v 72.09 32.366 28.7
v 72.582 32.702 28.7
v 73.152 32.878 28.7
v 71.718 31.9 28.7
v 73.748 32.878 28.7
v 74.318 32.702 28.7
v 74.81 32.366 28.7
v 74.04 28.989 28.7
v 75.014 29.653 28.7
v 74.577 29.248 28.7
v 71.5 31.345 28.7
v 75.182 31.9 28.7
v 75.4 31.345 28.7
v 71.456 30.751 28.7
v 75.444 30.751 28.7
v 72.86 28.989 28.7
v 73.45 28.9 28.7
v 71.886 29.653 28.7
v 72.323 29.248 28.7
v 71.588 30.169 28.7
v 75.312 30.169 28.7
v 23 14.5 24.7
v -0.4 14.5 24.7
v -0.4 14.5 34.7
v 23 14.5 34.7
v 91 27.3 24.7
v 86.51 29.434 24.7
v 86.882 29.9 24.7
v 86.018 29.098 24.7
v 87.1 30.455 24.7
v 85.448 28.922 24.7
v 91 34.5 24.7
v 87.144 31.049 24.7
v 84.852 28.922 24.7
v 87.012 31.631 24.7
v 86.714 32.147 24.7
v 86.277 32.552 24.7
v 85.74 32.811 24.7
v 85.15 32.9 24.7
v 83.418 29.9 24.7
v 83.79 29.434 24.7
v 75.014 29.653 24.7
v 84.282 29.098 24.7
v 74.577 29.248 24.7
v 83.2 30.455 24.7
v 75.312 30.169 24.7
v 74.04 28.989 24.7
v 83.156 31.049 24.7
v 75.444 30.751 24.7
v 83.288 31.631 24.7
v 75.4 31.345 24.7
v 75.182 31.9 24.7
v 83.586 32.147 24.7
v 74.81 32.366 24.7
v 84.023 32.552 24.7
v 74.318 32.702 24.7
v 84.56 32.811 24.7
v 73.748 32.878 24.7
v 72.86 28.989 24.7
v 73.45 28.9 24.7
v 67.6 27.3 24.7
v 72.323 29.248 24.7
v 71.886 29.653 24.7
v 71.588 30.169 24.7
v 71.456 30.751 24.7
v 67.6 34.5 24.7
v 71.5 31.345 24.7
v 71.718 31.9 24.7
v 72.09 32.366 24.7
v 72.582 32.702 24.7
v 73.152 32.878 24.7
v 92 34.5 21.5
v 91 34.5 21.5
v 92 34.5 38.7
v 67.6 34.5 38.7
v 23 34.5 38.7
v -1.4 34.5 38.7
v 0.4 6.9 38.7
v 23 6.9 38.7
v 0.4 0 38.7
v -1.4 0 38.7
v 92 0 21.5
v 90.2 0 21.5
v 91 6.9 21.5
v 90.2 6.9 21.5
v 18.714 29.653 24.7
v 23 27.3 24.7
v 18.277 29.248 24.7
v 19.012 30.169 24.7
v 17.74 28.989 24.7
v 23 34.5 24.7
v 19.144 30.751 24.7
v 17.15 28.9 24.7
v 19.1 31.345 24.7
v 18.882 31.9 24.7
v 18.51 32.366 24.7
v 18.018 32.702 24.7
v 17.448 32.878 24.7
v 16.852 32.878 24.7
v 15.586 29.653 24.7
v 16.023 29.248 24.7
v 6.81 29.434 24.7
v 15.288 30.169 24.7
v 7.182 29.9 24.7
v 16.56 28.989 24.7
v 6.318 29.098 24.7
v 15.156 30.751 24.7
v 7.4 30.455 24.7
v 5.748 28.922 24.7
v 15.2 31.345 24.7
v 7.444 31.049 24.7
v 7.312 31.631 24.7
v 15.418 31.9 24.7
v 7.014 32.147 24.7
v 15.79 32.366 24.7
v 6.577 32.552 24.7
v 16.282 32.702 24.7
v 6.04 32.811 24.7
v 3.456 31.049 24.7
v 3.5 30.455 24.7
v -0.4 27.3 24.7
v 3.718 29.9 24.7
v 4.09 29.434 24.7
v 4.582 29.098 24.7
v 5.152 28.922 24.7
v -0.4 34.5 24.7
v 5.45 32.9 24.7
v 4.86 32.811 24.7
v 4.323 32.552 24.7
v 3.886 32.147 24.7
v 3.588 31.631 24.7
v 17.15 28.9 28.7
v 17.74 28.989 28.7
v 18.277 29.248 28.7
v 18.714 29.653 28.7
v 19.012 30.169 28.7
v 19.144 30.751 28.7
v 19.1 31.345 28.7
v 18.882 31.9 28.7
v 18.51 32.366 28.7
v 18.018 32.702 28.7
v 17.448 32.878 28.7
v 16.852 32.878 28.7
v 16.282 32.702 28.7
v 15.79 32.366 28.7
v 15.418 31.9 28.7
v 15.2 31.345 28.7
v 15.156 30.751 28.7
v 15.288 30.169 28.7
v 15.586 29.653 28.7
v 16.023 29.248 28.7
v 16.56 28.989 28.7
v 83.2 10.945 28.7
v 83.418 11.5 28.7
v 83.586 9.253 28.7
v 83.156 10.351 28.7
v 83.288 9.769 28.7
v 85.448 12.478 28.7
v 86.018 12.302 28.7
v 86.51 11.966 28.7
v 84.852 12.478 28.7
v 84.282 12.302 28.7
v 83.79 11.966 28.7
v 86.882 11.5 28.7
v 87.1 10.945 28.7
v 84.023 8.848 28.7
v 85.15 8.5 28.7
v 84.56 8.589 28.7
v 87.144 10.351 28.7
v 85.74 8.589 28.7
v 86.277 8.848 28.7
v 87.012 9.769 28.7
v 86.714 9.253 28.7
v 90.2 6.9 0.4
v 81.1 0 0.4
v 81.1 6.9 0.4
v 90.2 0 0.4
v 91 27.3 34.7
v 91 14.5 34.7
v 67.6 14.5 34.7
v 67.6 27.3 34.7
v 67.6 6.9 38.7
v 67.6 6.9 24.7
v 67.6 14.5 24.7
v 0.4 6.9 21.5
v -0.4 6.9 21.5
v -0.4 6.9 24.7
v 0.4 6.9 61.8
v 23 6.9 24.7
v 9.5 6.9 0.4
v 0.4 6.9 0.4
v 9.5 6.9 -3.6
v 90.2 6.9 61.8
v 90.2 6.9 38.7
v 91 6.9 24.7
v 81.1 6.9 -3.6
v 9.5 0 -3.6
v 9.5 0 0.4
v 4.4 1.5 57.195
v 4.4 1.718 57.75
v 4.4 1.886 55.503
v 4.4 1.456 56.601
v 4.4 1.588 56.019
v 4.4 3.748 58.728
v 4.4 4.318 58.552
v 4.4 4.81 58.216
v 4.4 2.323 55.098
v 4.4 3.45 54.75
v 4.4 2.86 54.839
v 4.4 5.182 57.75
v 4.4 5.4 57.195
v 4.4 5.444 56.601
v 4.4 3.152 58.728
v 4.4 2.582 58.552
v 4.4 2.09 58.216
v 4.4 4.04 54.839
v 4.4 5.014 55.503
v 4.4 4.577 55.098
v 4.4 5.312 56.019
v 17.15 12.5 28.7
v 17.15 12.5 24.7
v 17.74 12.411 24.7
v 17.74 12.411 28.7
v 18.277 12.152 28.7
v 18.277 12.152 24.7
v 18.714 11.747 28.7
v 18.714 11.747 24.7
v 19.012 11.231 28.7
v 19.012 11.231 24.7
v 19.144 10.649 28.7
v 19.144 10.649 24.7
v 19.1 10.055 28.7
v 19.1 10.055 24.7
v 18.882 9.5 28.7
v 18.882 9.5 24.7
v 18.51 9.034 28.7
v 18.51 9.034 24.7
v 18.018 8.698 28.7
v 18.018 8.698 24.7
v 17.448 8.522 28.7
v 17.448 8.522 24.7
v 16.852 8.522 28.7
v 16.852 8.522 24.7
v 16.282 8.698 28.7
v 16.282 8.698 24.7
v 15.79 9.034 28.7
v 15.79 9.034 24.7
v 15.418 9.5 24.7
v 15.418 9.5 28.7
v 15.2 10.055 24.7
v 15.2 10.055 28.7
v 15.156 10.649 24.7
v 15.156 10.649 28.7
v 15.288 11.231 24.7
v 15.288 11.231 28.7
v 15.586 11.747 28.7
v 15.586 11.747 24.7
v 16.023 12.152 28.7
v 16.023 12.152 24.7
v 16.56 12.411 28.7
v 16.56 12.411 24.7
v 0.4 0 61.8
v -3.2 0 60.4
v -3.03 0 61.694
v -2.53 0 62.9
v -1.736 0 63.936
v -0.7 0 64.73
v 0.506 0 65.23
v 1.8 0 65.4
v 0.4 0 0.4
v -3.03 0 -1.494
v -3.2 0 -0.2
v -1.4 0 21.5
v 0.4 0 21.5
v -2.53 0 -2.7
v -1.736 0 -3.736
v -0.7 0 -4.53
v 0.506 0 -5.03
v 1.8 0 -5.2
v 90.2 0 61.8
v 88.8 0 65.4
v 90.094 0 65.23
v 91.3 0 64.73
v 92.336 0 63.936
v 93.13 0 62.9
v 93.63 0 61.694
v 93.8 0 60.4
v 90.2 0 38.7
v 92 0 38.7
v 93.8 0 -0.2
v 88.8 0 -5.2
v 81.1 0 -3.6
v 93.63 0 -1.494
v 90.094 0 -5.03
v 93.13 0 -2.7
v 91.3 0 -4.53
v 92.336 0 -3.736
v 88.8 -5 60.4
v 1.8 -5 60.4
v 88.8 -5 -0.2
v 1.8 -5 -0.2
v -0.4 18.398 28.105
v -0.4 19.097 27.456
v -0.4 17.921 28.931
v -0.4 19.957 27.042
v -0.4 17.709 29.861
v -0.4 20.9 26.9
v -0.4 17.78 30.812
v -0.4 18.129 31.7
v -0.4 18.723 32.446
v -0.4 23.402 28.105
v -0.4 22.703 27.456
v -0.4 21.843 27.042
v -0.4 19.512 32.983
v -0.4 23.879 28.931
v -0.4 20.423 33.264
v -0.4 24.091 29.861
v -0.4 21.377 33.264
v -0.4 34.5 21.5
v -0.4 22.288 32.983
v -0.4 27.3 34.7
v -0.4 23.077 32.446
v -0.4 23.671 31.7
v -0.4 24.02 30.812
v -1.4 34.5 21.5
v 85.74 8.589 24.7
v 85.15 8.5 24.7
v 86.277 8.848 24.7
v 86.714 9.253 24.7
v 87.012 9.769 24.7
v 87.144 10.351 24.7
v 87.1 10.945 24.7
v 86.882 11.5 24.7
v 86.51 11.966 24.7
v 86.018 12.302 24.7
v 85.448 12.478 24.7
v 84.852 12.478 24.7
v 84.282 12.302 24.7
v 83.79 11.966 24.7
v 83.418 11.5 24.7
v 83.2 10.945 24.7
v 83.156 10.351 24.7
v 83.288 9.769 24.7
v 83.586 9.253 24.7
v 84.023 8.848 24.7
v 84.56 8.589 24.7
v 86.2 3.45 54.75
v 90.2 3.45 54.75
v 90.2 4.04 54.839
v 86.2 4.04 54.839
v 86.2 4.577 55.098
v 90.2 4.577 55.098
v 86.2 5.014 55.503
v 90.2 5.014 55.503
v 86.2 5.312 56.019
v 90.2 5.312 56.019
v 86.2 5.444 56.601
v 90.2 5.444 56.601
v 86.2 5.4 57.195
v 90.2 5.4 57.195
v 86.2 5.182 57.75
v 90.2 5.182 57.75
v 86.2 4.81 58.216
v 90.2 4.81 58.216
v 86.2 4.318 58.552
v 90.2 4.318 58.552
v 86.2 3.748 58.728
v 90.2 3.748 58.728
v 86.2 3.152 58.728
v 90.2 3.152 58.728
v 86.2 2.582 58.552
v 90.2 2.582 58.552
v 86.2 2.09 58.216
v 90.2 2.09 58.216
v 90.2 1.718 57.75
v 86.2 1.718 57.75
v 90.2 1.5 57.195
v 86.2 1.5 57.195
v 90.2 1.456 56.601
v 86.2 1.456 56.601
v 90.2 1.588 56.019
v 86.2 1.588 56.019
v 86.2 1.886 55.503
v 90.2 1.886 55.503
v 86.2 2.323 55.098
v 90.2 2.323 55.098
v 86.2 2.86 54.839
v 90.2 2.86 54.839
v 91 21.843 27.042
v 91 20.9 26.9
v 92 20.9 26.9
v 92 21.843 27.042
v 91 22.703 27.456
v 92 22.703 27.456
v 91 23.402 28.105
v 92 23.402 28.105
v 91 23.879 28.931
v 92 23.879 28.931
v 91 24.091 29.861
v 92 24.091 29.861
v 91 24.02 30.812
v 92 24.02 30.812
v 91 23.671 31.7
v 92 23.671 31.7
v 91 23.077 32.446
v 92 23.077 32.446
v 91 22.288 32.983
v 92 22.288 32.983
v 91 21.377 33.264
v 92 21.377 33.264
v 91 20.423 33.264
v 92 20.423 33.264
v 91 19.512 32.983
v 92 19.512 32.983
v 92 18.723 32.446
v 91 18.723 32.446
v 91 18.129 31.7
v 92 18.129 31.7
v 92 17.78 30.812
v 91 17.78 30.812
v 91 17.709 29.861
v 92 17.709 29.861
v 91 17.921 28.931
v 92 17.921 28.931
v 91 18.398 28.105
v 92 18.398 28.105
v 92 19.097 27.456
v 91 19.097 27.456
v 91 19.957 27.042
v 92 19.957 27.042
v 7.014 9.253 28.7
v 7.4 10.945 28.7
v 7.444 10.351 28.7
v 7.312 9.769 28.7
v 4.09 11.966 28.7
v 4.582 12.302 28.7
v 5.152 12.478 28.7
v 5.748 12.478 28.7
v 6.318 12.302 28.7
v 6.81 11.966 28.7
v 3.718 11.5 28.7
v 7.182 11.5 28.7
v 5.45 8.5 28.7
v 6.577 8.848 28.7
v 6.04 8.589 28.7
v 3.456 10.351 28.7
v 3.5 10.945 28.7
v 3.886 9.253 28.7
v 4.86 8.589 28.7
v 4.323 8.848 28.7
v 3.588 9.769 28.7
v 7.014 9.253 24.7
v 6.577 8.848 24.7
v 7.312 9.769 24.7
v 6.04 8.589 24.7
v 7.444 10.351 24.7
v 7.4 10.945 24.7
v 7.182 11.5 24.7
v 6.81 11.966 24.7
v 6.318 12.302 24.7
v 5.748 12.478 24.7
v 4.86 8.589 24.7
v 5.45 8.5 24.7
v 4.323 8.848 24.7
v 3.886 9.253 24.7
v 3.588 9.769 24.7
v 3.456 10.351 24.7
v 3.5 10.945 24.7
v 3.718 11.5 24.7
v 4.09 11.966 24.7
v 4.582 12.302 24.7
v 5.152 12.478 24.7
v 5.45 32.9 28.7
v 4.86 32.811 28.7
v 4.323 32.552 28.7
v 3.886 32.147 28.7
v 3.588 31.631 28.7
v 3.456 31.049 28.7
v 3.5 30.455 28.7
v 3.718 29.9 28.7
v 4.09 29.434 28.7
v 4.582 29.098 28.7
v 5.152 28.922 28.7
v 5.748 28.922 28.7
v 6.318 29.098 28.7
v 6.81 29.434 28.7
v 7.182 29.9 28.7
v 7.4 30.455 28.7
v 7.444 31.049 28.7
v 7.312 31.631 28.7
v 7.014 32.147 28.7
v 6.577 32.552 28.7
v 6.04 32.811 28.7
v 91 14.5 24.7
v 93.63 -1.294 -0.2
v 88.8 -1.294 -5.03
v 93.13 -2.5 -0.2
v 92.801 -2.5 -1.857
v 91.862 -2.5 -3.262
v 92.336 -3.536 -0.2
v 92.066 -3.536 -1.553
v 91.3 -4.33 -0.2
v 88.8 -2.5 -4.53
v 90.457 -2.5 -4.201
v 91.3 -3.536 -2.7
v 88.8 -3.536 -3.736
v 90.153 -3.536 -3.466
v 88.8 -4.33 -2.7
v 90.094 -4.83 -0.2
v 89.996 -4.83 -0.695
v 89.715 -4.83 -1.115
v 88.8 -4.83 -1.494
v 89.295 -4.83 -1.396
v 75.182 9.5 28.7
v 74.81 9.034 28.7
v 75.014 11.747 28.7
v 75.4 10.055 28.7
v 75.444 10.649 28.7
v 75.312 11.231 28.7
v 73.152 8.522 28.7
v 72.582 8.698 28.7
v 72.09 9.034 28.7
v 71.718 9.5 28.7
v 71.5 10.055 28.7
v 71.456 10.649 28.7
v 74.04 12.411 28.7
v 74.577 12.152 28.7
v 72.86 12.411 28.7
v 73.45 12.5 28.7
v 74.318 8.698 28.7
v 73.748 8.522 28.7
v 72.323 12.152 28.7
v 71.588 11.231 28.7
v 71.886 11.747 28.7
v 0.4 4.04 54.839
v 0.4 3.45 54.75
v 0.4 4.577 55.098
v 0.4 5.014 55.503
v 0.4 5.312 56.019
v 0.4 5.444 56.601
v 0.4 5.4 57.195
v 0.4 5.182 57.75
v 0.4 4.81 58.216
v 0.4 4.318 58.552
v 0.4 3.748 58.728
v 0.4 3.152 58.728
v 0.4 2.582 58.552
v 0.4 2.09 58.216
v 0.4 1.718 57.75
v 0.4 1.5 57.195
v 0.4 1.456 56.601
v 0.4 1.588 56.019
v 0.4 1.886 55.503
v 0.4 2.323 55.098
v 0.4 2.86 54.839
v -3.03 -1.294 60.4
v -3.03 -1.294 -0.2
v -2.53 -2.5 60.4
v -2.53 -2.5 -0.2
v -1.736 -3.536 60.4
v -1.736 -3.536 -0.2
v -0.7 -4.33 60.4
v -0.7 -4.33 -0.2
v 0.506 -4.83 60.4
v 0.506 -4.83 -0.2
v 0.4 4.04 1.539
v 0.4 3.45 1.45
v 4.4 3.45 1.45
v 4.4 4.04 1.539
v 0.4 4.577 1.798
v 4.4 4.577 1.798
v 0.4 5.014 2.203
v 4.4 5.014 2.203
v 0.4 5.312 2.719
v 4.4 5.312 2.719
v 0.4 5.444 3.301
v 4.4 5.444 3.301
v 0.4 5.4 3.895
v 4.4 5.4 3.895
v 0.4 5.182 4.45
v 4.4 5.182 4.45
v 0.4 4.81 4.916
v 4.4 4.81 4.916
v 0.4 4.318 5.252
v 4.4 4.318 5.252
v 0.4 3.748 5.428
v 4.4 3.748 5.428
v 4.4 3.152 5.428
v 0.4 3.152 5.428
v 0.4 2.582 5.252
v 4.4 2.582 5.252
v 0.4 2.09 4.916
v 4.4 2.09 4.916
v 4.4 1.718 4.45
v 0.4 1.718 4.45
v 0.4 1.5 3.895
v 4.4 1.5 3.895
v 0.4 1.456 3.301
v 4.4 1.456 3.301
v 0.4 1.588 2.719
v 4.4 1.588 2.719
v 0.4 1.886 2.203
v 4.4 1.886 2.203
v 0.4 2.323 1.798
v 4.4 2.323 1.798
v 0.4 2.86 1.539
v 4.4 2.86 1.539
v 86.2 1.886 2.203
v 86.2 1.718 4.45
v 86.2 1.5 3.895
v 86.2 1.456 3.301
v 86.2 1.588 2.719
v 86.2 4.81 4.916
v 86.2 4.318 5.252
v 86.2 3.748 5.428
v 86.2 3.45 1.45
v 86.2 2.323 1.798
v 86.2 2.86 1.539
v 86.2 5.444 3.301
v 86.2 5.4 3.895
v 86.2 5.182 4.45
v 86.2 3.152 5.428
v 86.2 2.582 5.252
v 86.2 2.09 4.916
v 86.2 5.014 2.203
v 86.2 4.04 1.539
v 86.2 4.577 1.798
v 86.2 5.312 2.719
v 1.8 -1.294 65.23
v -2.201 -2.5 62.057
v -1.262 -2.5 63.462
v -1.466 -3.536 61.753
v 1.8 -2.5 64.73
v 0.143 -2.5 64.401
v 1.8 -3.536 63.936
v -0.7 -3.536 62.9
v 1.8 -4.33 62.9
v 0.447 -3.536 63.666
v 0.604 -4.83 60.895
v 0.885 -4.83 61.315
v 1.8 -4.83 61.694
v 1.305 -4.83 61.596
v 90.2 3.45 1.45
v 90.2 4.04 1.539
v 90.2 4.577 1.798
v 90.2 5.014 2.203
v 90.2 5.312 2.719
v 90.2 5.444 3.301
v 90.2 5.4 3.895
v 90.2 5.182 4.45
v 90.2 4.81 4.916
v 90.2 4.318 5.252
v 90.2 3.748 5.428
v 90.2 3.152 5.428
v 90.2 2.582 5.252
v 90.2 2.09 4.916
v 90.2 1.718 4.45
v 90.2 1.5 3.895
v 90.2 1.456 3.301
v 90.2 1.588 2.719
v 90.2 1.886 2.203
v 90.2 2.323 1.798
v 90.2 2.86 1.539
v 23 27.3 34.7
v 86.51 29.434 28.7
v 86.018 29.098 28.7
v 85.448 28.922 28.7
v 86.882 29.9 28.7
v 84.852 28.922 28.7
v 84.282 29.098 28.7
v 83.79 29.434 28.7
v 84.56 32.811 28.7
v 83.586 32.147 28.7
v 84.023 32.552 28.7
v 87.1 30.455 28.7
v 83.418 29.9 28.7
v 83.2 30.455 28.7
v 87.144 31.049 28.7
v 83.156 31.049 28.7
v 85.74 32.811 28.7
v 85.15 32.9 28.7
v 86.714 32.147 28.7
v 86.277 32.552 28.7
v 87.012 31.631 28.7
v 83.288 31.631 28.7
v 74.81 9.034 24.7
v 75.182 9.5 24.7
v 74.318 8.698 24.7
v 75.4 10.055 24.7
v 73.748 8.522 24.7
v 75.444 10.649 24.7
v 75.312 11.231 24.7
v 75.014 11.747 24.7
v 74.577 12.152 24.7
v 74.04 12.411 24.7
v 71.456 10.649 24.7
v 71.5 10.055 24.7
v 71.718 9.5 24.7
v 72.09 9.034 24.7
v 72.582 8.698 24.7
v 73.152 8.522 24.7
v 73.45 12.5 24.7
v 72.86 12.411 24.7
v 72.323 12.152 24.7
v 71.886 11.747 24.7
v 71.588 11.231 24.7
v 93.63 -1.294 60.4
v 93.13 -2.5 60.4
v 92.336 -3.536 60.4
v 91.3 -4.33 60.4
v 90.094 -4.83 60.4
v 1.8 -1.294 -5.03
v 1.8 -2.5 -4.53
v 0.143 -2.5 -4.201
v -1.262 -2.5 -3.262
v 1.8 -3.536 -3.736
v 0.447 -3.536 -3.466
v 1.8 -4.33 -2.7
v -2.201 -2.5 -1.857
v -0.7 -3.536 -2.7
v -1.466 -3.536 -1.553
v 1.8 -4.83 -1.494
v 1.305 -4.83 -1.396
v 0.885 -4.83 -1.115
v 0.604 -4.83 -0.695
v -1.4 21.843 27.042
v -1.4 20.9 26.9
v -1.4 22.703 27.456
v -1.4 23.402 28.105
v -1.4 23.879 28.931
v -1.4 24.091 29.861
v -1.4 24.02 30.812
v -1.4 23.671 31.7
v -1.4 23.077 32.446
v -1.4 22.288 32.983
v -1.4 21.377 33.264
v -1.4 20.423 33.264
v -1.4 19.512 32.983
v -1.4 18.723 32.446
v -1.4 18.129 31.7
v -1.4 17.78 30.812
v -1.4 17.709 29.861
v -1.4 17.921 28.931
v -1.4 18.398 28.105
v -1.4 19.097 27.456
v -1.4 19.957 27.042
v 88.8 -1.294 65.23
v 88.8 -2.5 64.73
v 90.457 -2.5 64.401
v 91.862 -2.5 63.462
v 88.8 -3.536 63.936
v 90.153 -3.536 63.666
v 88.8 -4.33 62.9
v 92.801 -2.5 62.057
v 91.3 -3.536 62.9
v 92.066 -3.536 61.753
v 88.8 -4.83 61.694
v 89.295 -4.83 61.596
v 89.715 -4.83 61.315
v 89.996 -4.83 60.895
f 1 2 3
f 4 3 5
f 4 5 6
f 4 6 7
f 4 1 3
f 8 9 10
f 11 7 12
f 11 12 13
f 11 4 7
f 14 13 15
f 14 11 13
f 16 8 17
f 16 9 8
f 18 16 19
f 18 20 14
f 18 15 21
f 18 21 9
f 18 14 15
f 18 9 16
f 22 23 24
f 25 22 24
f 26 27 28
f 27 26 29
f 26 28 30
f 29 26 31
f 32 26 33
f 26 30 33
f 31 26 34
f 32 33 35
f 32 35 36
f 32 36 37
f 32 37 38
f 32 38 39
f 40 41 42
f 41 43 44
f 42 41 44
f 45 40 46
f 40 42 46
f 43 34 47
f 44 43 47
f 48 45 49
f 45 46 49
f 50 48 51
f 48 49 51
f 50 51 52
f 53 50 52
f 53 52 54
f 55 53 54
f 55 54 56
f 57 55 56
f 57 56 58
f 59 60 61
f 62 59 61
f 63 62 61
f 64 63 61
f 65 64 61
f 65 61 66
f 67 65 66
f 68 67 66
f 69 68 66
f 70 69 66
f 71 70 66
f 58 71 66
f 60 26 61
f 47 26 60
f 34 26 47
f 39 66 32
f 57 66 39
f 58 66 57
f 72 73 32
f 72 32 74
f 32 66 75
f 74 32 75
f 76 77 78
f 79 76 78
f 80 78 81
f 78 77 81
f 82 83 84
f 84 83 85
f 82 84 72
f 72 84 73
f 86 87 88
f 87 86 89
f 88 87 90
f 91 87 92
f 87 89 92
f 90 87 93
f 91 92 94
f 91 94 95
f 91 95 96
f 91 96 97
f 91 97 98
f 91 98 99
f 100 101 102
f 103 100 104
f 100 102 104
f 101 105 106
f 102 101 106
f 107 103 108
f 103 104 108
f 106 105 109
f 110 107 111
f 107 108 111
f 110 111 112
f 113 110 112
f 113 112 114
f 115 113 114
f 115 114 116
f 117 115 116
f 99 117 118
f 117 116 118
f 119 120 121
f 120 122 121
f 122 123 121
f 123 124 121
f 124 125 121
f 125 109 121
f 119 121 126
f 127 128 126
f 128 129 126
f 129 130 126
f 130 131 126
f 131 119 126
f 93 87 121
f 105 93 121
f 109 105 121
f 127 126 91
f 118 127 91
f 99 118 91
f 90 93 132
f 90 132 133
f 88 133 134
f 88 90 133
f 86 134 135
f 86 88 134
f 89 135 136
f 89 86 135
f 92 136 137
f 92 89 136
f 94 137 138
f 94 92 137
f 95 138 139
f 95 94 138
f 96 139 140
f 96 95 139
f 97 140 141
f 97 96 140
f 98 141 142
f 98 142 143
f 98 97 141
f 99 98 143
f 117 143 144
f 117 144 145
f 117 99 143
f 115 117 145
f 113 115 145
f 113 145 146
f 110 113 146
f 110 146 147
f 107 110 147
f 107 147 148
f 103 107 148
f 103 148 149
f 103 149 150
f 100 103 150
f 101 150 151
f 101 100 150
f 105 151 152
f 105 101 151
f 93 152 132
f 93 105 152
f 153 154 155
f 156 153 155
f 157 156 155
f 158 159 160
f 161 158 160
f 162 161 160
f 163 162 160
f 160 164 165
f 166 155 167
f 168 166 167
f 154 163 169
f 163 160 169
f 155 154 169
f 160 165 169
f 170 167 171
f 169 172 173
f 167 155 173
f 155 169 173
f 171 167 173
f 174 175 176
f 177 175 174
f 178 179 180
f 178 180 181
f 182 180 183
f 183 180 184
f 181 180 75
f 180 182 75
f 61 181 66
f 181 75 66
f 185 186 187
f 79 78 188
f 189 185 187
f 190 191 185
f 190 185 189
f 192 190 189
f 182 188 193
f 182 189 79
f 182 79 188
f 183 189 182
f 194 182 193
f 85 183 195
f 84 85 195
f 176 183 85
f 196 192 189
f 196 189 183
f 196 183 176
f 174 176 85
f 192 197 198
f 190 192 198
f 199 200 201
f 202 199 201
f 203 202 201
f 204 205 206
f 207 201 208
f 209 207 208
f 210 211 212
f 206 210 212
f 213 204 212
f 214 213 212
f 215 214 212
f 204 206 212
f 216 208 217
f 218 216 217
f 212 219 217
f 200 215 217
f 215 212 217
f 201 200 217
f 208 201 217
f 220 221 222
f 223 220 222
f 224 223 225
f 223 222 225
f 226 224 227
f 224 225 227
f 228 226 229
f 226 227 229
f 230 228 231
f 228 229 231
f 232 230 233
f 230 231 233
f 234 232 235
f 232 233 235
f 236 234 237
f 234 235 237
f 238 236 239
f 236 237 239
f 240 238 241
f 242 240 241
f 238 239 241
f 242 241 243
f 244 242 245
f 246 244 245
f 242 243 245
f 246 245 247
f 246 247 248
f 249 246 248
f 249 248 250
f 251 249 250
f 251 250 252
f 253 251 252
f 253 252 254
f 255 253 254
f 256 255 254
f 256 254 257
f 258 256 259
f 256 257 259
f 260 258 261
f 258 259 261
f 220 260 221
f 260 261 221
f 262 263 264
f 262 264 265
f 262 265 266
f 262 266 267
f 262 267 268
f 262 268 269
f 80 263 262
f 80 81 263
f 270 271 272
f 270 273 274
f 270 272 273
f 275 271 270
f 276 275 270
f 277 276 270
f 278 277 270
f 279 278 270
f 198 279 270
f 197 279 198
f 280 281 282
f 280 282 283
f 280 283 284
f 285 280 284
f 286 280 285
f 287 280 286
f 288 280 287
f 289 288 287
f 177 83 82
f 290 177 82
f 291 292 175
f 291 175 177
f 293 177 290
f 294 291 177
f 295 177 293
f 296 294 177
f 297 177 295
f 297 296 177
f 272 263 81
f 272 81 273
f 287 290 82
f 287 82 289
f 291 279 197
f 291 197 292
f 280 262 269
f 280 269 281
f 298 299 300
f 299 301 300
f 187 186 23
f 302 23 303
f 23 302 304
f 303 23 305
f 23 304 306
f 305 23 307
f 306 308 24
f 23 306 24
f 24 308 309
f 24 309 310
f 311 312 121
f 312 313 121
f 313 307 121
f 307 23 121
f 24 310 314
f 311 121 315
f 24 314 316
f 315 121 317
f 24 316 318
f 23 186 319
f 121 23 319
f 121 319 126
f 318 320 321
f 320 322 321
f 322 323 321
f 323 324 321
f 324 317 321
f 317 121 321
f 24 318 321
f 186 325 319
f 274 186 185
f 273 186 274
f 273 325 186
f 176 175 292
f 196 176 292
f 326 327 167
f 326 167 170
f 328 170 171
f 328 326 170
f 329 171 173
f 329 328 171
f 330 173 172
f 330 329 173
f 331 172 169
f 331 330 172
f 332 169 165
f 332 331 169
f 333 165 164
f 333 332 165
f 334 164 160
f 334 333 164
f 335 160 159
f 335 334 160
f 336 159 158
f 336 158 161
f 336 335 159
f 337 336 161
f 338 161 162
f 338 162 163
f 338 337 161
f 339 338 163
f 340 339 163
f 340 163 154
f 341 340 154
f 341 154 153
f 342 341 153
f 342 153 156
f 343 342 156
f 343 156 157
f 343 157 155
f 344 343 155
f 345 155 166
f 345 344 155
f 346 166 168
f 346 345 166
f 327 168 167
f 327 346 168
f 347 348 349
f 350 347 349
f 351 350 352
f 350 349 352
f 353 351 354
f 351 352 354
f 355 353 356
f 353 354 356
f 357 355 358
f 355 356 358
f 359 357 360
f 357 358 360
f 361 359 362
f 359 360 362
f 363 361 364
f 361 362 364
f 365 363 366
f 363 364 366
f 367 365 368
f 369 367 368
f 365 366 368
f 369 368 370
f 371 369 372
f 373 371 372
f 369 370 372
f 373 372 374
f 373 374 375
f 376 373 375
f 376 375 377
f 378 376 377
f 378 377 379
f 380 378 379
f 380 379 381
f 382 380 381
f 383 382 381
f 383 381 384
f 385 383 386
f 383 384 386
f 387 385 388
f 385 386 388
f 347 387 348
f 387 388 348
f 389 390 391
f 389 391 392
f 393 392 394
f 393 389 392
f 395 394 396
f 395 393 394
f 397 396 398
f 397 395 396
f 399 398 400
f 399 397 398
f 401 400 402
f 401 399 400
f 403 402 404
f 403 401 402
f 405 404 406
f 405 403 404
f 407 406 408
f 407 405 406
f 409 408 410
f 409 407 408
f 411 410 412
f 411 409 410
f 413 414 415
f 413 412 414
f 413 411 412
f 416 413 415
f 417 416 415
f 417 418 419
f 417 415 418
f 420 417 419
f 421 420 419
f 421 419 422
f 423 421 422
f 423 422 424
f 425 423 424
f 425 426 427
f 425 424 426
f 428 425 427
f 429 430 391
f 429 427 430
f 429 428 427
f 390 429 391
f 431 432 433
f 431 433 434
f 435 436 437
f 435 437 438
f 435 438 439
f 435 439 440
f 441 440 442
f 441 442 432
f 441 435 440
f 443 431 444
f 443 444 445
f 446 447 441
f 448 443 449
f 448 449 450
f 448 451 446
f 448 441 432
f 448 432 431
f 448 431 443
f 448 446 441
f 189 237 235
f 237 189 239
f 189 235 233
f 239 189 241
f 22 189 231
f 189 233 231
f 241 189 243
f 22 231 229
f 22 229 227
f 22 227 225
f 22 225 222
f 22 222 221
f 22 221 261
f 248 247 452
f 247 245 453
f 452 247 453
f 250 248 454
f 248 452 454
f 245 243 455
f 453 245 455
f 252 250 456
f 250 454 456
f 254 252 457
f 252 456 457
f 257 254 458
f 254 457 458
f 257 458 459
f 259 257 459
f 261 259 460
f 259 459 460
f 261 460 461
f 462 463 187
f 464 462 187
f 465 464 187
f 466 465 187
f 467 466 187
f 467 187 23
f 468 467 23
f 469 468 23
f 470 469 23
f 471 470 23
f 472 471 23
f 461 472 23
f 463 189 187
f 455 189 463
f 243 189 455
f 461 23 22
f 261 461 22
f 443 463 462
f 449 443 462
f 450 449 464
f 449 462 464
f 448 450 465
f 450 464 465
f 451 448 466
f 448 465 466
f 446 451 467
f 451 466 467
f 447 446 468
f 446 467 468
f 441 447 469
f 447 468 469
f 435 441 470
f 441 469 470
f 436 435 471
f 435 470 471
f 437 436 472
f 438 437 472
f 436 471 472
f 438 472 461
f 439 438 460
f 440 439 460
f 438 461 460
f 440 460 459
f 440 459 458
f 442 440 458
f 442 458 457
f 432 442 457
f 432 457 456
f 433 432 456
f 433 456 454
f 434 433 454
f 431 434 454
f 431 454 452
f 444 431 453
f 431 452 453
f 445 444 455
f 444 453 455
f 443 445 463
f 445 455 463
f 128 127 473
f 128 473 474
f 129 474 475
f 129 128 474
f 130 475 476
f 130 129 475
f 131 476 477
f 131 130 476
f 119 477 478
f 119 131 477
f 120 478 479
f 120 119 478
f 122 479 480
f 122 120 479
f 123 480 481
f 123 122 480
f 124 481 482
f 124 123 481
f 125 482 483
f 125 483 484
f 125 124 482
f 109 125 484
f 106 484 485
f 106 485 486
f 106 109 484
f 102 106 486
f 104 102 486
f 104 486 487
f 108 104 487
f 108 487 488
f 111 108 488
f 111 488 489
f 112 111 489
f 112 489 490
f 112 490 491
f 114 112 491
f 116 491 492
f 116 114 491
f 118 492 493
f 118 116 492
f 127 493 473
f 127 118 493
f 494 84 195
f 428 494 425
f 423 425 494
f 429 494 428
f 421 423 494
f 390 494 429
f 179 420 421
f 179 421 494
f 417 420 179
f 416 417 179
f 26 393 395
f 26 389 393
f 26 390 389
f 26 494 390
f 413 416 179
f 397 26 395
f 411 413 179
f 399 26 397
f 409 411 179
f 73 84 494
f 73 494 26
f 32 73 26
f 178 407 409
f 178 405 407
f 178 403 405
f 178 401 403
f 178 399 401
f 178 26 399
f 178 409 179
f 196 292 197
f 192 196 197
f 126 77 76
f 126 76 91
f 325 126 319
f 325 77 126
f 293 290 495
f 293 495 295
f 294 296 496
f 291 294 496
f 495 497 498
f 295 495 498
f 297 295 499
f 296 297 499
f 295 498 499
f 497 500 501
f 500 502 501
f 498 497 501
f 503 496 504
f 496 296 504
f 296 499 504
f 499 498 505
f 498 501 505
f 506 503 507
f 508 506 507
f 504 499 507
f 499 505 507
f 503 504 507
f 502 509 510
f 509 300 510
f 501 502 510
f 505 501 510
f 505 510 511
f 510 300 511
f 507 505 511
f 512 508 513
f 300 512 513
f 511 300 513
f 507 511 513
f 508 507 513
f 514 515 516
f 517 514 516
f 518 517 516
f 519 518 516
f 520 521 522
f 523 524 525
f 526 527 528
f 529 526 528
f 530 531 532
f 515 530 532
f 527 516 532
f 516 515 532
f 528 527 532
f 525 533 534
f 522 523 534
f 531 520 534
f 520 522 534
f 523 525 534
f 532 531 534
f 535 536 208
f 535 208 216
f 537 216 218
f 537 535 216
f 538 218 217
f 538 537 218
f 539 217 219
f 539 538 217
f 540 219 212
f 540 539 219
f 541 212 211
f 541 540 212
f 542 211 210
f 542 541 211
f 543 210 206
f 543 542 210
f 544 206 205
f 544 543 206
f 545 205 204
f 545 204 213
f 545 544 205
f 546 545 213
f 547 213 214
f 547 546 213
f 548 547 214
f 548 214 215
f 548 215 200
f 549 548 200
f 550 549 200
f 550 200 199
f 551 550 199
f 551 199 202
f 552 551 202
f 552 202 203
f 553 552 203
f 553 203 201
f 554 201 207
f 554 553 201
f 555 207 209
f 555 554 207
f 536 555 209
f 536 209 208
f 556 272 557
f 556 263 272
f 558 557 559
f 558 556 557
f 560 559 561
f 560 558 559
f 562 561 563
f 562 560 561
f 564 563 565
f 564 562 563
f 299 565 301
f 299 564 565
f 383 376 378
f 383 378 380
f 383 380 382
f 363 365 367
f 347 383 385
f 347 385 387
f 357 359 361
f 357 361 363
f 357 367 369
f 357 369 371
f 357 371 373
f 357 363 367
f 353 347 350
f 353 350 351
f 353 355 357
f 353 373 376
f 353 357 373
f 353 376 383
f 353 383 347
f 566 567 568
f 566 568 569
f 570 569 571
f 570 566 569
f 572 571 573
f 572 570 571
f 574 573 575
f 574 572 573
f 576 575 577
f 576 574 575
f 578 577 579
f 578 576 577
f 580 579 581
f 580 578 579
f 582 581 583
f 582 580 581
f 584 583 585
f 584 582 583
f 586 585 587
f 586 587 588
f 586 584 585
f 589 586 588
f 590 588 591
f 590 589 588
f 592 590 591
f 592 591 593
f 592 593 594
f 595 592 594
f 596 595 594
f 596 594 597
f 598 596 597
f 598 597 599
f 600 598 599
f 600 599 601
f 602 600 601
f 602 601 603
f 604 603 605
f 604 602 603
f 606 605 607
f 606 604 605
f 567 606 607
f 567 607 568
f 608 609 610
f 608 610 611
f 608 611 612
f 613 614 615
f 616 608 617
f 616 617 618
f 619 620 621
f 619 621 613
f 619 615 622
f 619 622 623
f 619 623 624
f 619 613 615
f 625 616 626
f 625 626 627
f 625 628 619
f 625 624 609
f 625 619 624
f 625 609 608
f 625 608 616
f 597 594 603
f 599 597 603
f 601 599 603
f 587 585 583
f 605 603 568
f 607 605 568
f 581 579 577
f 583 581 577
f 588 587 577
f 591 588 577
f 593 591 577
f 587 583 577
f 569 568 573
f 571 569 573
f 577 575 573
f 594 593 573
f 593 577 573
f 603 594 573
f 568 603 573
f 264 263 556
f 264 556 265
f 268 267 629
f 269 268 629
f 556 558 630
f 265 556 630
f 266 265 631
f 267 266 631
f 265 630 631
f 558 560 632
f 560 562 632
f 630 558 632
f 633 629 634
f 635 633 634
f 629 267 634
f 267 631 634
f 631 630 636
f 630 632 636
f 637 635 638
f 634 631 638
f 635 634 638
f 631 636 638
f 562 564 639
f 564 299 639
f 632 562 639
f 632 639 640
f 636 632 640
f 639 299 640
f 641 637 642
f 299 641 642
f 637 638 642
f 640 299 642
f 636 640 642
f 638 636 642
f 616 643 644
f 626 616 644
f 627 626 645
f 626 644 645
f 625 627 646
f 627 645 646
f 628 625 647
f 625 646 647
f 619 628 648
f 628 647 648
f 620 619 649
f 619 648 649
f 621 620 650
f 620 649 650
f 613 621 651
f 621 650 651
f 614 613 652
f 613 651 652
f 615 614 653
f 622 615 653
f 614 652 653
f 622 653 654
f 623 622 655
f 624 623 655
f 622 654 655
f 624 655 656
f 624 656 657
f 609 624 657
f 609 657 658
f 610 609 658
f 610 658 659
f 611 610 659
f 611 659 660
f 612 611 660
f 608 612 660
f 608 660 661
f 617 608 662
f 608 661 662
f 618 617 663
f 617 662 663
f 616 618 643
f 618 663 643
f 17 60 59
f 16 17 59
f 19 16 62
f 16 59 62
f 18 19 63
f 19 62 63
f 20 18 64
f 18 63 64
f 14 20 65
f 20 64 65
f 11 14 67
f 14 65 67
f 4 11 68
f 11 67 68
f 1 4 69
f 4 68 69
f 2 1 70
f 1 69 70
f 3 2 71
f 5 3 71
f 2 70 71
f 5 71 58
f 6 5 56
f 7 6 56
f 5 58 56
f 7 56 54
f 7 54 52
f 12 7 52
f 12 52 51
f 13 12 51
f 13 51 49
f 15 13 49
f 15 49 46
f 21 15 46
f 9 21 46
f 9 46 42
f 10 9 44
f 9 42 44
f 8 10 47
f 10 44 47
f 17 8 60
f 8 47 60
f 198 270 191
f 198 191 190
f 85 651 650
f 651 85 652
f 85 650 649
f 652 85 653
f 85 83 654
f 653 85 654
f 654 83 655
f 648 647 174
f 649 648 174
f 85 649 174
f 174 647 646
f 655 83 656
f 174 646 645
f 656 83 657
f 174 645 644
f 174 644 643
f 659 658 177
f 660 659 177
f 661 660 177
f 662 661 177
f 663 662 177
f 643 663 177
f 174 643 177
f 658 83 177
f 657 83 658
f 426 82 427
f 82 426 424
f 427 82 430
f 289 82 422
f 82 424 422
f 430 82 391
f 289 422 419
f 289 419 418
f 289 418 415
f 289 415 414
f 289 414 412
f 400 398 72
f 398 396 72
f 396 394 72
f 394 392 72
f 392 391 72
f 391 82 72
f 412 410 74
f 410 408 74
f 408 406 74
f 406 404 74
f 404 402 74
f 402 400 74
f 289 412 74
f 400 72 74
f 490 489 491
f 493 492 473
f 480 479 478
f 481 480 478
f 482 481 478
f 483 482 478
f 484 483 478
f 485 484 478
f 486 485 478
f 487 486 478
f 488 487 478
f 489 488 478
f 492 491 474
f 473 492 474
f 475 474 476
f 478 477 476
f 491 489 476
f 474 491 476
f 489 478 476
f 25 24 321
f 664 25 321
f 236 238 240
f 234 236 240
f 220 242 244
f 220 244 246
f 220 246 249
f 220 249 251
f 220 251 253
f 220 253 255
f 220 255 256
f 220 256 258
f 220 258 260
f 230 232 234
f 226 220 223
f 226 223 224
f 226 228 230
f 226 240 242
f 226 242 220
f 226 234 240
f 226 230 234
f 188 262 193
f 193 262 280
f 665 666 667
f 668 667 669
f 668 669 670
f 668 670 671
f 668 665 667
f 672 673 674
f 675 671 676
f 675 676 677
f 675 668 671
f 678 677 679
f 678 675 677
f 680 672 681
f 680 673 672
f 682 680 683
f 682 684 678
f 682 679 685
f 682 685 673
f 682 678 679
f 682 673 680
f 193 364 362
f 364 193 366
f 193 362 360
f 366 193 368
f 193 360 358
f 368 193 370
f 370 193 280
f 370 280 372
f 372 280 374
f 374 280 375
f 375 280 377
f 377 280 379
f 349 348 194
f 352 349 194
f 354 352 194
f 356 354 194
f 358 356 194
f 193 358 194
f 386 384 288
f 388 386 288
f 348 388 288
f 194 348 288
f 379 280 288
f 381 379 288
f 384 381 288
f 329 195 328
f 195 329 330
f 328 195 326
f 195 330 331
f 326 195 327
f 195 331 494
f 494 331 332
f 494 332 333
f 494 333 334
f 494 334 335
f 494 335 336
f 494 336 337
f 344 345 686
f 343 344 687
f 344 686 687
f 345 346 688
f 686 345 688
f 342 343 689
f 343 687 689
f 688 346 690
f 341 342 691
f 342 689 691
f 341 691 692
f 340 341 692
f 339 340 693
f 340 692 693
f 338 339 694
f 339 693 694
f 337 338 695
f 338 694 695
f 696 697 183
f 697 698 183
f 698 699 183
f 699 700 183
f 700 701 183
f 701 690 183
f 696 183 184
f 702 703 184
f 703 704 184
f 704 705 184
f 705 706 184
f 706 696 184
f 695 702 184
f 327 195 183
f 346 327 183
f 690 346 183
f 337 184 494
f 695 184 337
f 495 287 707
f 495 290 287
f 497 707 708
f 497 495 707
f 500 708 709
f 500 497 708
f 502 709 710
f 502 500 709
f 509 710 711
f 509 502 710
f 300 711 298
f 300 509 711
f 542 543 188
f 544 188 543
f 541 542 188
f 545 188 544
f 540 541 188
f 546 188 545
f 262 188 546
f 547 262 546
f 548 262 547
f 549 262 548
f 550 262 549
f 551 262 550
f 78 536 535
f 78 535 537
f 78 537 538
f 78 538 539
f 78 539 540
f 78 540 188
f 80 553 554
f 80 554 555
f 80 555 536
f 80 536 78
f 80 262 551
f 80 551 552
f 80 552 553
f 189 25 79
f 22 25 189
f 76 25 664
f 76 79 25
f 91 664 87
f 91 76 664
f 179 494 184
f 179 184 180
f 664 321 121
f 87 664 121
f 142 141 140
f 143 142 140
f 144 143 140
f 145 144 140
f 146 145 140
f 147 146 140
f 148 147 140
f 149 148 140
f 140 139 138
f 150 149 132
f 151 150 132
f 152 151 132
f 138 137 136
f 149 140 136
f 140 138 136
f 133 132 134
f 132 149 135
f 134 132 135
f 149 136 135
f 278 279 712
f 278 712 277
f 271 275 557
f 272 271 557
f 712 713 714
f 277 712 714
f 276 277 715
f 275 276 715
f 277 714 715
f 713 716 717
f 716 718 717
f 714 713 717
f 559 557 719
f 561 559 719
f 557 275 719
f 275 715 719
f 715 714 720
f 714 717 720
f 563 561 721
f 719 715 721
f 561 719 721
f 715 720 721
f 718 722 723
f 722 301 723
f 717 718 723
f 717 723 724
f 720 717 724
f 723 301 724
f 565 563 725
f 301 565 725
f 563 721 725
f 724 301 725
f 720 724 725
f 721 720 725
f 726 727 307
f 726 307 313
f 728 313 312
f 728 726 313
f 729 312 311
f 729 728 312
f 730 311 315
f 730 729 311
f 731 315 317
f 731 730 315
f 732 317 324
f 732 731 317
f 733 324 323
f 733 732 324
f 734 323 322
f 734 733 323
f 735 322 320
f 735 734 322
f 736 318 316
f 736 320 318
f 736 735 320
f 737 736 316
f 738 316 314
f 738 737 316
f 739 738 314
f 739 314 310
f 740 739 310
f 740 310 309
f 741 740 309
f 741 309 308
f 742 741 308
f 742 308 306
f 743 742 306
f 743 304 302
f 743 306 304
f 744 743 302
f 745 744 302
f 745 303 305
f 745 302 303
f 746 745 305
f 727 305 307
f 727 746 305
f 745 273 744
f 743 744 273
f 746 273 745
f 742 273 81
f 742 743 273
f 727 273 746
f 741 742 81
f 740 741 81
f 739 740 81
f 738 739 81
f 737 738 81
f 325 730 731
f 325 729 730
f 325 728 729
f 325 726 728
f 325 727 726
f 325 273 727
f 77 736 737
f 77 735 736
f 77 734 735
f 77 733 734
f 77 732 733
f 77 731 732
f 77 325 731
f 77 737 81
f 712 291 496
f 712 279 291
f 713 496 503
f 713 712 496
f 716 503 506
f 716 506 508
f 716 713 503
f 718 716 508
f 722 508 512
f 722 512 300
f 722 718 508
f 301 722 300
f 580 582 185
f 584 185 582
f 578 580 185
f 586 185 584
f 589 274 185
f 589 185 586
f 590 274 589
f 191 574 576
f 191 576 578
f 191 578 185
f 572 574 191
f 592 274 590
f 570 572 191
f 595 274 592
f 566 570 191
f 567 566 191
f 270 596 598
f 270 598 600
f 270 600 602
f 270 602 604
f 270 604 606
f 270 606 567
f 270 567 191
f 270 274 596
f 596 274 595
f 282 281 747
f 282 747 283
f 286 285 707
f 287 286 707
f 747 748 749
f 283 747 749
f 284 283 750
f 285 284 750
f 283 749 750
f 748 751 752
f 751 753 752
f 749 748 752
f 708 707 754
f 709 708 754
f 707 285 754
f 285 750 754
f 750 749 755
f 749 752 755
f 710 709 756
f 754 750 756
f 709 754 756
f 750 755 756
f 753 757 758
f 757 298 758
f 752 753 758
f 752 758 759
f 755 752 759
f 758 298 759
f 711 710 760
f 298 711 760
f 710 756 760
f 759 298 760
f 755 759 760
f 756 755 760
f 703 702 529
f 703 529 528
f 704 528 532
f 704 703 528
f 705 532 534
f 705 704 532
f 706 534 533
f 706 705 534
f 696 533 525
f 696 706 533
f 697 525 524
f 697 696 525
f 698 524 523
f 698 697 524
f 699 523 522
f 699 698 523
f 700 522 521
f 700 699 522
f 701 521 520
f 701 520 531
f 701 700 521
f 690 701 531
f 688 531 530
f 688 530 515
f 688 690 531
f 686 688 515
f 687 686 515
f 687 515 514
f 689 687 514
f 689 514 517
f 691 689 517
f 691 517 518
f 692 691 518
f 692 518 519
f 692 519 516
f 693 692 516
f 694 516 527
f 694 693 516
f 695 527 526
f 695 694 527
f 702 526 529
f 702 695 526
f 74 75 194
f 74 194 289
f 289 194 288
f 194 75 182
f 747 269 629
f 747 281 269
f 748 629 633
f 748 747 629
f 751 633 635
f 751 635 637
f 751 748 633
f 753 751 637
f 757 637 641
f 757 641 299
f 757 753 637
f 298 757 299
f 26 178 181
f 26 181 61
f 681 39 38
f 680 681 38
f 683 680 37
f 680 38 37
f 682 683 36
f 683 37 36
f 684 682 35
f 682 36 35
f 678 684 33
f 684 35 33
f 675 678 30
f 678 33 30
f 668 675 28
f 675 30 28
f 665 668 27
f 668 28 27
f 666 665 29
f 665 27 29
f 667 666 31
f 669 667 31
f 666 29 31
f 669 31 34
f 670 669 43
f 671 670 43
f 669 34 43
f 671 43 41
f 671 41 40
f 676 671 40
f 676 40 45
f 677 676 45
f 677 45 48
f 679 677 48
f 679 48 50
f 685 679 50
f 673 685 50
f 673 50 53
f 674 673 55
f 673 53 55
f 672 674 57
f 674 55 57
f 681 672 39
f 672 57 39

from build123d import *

# Parameters (mm, degrees)
SKETCH1_W               = 89.8
SKETCH1_H               = 61.4
BOSS_EXTRUDE1_DEPTH     = 6.9
SKETCH2_R               = 2
CUT_EXTRUDE1_DEPTH      = 4
SKETCH3_W               = 97
SKETCH3_H               = 70.6
BOSS_EXTRUDE2_DEPTH     = 5
SKETCH5_W               = 10.4
SKETCH5_H               = 6.9
SKETCH5_W_2             = 3.4
BOSS_EXTRUDE3_DEPTH     = 1.8
BOSS_EXTRUDE4_START     = 1.8
SKETCH5_3_W             = 10.4
SKETCH5_3_H             = 6.9
SKETCH5_3_H_2           = 27.6
SKETCH5_3_W_2           = 3.4
BOSS_EXTRUDE4_DEPTH     = 1
BOSS_EXTRUDE6_START     = -89.8
SKETCH5_5_W             = 3.4
SKETCH5_5_H             = 6.9
SKETCH5_5_W_2           = 10.4
BOSS_EXTRUDE6_DEPTH     = 1.8
BOSS_EXTRUDE7_START     = -91.6
SKETCH5_7_W             = 3.4
SKETCH5_7_H             = 6.9
SKETCH5_7_H_2           = 27.6
SKETCH5_7_W_2           = 10.4
BOSS_EXTRUDE7_DEPTH     = 1
CUT_EXTRUDE2_DEPTH      = 120.754123102
CUT_EXTRUDE2_DEPTH_BACK = 120.754123102
SKETCH6_R               = 3.2
BOSS_EXTRUDE9_START     = -24.4
BOSS_EXTRUDE9_DEPTH     = 23.4
BOSS_EXTRUDE10_START    = -92.4
SKETCH7_4_W             = 10
SKETCH7_4_H             = 7.6
SKETCH7_4_W_2           = 4
SKETCH7_4_H_2           = 7.2
BOSS_EXTRUDE10_DEPTH    = 23.4
SKETCH9_R               = 2
CUT_EXTRUDE3_DEPTH      = 4
MIRROR4_COPY_1_SKETCH_R = 2
MIRROR4_COPY_1_DEPTH    = 4
FILLET1_R               = 5
FILLET2_R               = 5
SKETCH12_R              = 2
CUT_EXTRUDE6_DEPTH      = 4


with BuildPart() as part:
    # Sketch1 → Boss-Extrude1 (new body)
    with BuildSketch(Plane(origin=(0, 0, 0), x_dir=(1, 0, 0), z_dir=(0, 1, 0))):
        with Locations((45.3, -31.1)):
            Rectangle(SKETCH1_W, SKETCH1_H)
        Polygon((81.1, 0), (81.1, 3.6), (9.5, 3.6), (9.5, 0), (9.5, -0.4), (81.1, -0.4), align=None)
    extrude(amount=BOSS_EXTRUDE1_DEPTH)

    # Sketch2 → Cut-Extrude1 (cut)
    with BuildSketch(Plane(origin=(90.2, 0, 0), x_dir=(0, 0, -1), z_dir=(1, 0, 0))):
        with Locations((-3.45, 3.45)):
            Circle(SKETCH2_R)
    cut_extrude1 = extrude(amount=-CUT_EXTRUDE1_DEPTH, mode=Mode.SUBTRACT)

    # Mirror1: Cut-Extrude1 across plane
    add(cut_extrude1.mirror(Plane(origin=(45.3, 0, 0), x_dir=(0, 0, 1), z_dir=(1, 0, 0))), mode=Mode.SUBTRACT)

    # Sketch3 → Boss-Extrude2 (add)
    with BuildSketch(Plane(origin=(0, 0, 0), x_dir=(1, 0, 0), z_dir=(0, 1, 0))):
        with Locations((45.3, -30.1)):
            Rectangle(SKETCH3_W, SKETCH3_H)
    extrude(amount=-BOSS_EXTRUDE2_DEPTH)

    # Sketch5 → Boss-Extrude3 (add)
    with BuildSketch(Plane.ZY.offset(-0.4)):
        with Locations((30.1, 3.45)):
            Rectangle(SKETCH5_W, SKETCH5_H)
        with Locations((23.2, 3.45)):
            Rectangle(SKETCH5_W_2, SKETCH5_H)
        with Locations((37, 3.45)):
            Rectangle(SKETCH5_W_2, SKETCH5_H)
    extrude(amount=BOSS_EXTRUDE3_DEPTH)

    # Sketch5<3> → Boss-Extrude4 (add)
    with BuildSketch(Plane.ZY.offset(-0.4).offset(BOSS_EXTRUDE4_START)):
        with Locations((30.1, 3.45)):
            Rectangle(SKETCH5_3_W, SKETCH5_3_H)
        with Locations((30.1, 20.7)):
            Rectangle(SKETCH5_3_W, SKETCH5_3_H_2)
        with Locations((23.2, 20.7)):
            Rectangle(SKETCH5_3_W_2, SKETCH5_3_H_2)
        with Locations((23.2, 3.45)):
            Rectangle(SKETCH5_3_W_2, SKETCH5_3_H)
        with Locations((37, 3.45)):
            Rectangle(SKETCH5_3_W_2, SKETCH5_3_H)
        with Locations((37, 20.7)):
            Rectangle(SKETCH5_3_W_2, SKETCH5_3_H_2)
    extrude(amount=-BOSS_EXTRUDE4_DEPTH)

    # Sketch5<5> → Boss-Extrude6 (add)
    with BuildSketch(Plane.ZY.offset(-0.4).offset(BOSS_EXTRUDE6_START)):
        with Locations((23.2, 3.45)):
            Rectangle(SKETCH5_5_W, SKETCH5_5_H)
        with Locations((37, 3.45)):
            Rectangle(SKETCH5_5_W, SKETCH5_5_H)
        with Locations((30.1, 3.45)):
            Rectangle(SKETCH5_5_W_2, SKETCH5_5_H)
    extrude(amount=-BOSS_EXTRUDE6_DEPTH)

    # Sketch5<7> → Boss-Extrude7 (add)
    with BuildSketch(Plane.ZY.offset(-0.4).offset(BOSS_EXTRUDE7_START)):
        with Locations((37, 3.45)):
            Rectangle(SKETCH5_7_W, SKETCH5_7_H)
        with Locations((37, 20.7)):
            Rectangle(SKETCH5_7_W, SKETCH5_7_H_2)
        with Locations((30.1, 20.7)):
            Rectangle(SKETCH5_7_W_2, SKETCH5_7_H_2)
        with Locations((23.2, 20.7)):
            Rectangle(SKETCH5_7_W, SKETCH5_7_H_2)
        with Locations((23.2, 3.45)):
            Rectangle(SKETCH5_7_W, SKETCH5_7_H)
        with Locations((30.1, 3.45)):
            Rectangle(SKETCH5_7_W_2, SKETCH5_7_H)
    extrude(amount=BOSS_EXTRUDE7_DEPTH)

    # Sketch6 → Cut-Extrude2 (cut, two sides: drawn at the far end of the back side and taken through both)
    with BuildSketch(Plane(origin=(-0.4, 0, 0), x_dir=(0, 0, -1), z_dir=(1, 0, 0)).offset(-CUT_EXTRUDE2_DEPTH_BACK)):
        with Locations((-30.1, 20.9)):
            Circle(SKETCH6_R)
    extrude(amount=CUT_EXTRUDE2_DEPTH + CUT_EXTRUDE2_DEPTH_BACK, mode=Mode.SUBTRACT)

    # Sketch7 → Boss-Extrude9 (add)
    with BuildSketch(Plane(origin=(92, 0, 0), x_dir=(0, 0, -1), z_dir=(1, 0, 0)).offset(BOSS_EXTRUDE9_START)):
        Polygon((-38.7, 34.5), (-38.7, 6.9), (-24.7, 6.9), (-24.7, 14.5), (-34.7, 14.5), (-34.7, 27.3), (-24.7, 27.3), (-24.7, 34.5), align=None)
    extrude(amount=BOSS_EXTRUDE9_DEPTH)

    # Sketch7<4> → Boss-Extrude10 (add)
    with BuildSketch(Plane(origin=(92, 0, 0), x_dir=(0, 0, -1), z_dir=(1, 0, 0)).offset(BOSS_EXTRUDE10_START)):
        with Locations((-29.7, 10.7)):
            Rectangle(SKETCH7_4_W, SKETCH7_4_H)
        with Locations((-36.7, 10.7)):
            Rectangle(SKETCH7_4_W_2, SKETCH7_4_H)
        with Locations((-36.7, 30.9)):
            Rectangle(SKETCH7_4_W_2, SKETCH7_4_H_2)
        with Locations((-29.7, 30.9)):
            Rectangle(SKETCH7_4_W, SKETCH7_4_H_2)
        Polygon((-38.7, 27.3), (-38.7, 20.9), (-38.7, 14.5), (-34.7, 14.5), (-34.7, 27.3), align=None)
    extrude(amount=BOSS_EXTRUDE10_DEPTH)

    # Sketch9 → Cut-Extrude3 (cut)
    with BuildSketch(Plane(origin=(0, 0, 24.7), x_dir=(-1, 0, 0), z_dir=(0, 0, -1))):
        with Locations(Location((-85.15, 30.9, 0), (0, 0, 90))):
            Circle(SKETCH9_R)
        with Locations(Location((-73.45, 30.9, 0), (0, 0, 270))):
            Circle(SKETCH9_R)
    cut_extrude3 = extrude(amount=-CUT_EXTRUDE3_DEPTH, mode=Mode.SUBTRACT)

    # Mirror3: Cut-Extrude3 across plane
    add(cut_extrude3.mirror(Plane(origin=(45.3, 0, 0), x_dir=(0, 0, 1), z_dir=(1, 0, 0))), mode=Mode.SUBTRACT)

    # Mirror4: Cut-Extrude3 across plane
    add(cut_extrude3.mirror(Plane.ZX.offset(20.7)), mode=Mode.SUBTRACT)

    # Mirror4 copy 1 sketch → Mirror4 copy 1 (cut)
    with BuildSketch(Plane(origin=(90.6, 41.4, 24.7), x_dir=(1, 0, 0), z_dir=(0, 0, -1))):
        with Locations(Location((-85.15, 30.9, 0), (0, 0, 90))):
            Circle(MIRROR4_COPY_1_SKETCH_R)
        with Locations(Location((-73.45, 30.9, 0), (0, 0, 270))):
            Circle(MIRROR4_COPY_1_SKETCH_R)
    extrude(amount=-MIRROR4_COPY_1_DEPTH, mode=Mode.SUBTRACT)

    # Fillet1
    fillet1_edges = [part.edges().sort_by_distance(p)[0] for p in [
        (93.8, -2.5, -5.2),
        (93.8, -2.5, 65.4),
        (-3.2, -2.5, 65.4),
        (-3.2, -2.5, -5.2),
    ]]
    fillet(fillet1_edges, radius=FILLET1_R)

    # Fillet2
    fillet2_edges = [part.edges().sort_by_distance(p)[0] for p in [
        (92.335533906, -5, 63.935533906),
        (93.8, -5, 30.1),
        (92.335533906, -5, -3.735533906),
        (45.3, -5, -5.2),
        (-1.735533906, -5, -3.735533906),
        (-3.2, -5, 30.1),
        (-1.735533906, -5, 63.935533906),
        (45.3, -5, 65.4),
    ]]
    fillet(fillet2_edges, radius=FILLET2_R - 0.0001)  # a hair under: the kernel refuses the full size

    # Sketch12 → Cut-Extrude6 (cut)
    with BuildSketch(Plane(origin=(90.2, 0, 0), x_dir=(0, 0, -1), z_dir=(1, 0, 0))):
        with Locations((-56.75, 3.45)):
            Circle(SKETCH12_R)
    cut_extrude6 = extrude(amount=-CUT_EXTRUDE6_DEPTH, mode=Mode.SUBTRACT)

    # Mirror5: Cut-Extrude6 across plane
    add(cut_extrude6.mirror(Plane(origin=(45.3, 0, 0), x_dir=(0, 0, 1), z_dir=(1, 0, 0))), mode=Mode.SUBTRACT)


solid = part.part
